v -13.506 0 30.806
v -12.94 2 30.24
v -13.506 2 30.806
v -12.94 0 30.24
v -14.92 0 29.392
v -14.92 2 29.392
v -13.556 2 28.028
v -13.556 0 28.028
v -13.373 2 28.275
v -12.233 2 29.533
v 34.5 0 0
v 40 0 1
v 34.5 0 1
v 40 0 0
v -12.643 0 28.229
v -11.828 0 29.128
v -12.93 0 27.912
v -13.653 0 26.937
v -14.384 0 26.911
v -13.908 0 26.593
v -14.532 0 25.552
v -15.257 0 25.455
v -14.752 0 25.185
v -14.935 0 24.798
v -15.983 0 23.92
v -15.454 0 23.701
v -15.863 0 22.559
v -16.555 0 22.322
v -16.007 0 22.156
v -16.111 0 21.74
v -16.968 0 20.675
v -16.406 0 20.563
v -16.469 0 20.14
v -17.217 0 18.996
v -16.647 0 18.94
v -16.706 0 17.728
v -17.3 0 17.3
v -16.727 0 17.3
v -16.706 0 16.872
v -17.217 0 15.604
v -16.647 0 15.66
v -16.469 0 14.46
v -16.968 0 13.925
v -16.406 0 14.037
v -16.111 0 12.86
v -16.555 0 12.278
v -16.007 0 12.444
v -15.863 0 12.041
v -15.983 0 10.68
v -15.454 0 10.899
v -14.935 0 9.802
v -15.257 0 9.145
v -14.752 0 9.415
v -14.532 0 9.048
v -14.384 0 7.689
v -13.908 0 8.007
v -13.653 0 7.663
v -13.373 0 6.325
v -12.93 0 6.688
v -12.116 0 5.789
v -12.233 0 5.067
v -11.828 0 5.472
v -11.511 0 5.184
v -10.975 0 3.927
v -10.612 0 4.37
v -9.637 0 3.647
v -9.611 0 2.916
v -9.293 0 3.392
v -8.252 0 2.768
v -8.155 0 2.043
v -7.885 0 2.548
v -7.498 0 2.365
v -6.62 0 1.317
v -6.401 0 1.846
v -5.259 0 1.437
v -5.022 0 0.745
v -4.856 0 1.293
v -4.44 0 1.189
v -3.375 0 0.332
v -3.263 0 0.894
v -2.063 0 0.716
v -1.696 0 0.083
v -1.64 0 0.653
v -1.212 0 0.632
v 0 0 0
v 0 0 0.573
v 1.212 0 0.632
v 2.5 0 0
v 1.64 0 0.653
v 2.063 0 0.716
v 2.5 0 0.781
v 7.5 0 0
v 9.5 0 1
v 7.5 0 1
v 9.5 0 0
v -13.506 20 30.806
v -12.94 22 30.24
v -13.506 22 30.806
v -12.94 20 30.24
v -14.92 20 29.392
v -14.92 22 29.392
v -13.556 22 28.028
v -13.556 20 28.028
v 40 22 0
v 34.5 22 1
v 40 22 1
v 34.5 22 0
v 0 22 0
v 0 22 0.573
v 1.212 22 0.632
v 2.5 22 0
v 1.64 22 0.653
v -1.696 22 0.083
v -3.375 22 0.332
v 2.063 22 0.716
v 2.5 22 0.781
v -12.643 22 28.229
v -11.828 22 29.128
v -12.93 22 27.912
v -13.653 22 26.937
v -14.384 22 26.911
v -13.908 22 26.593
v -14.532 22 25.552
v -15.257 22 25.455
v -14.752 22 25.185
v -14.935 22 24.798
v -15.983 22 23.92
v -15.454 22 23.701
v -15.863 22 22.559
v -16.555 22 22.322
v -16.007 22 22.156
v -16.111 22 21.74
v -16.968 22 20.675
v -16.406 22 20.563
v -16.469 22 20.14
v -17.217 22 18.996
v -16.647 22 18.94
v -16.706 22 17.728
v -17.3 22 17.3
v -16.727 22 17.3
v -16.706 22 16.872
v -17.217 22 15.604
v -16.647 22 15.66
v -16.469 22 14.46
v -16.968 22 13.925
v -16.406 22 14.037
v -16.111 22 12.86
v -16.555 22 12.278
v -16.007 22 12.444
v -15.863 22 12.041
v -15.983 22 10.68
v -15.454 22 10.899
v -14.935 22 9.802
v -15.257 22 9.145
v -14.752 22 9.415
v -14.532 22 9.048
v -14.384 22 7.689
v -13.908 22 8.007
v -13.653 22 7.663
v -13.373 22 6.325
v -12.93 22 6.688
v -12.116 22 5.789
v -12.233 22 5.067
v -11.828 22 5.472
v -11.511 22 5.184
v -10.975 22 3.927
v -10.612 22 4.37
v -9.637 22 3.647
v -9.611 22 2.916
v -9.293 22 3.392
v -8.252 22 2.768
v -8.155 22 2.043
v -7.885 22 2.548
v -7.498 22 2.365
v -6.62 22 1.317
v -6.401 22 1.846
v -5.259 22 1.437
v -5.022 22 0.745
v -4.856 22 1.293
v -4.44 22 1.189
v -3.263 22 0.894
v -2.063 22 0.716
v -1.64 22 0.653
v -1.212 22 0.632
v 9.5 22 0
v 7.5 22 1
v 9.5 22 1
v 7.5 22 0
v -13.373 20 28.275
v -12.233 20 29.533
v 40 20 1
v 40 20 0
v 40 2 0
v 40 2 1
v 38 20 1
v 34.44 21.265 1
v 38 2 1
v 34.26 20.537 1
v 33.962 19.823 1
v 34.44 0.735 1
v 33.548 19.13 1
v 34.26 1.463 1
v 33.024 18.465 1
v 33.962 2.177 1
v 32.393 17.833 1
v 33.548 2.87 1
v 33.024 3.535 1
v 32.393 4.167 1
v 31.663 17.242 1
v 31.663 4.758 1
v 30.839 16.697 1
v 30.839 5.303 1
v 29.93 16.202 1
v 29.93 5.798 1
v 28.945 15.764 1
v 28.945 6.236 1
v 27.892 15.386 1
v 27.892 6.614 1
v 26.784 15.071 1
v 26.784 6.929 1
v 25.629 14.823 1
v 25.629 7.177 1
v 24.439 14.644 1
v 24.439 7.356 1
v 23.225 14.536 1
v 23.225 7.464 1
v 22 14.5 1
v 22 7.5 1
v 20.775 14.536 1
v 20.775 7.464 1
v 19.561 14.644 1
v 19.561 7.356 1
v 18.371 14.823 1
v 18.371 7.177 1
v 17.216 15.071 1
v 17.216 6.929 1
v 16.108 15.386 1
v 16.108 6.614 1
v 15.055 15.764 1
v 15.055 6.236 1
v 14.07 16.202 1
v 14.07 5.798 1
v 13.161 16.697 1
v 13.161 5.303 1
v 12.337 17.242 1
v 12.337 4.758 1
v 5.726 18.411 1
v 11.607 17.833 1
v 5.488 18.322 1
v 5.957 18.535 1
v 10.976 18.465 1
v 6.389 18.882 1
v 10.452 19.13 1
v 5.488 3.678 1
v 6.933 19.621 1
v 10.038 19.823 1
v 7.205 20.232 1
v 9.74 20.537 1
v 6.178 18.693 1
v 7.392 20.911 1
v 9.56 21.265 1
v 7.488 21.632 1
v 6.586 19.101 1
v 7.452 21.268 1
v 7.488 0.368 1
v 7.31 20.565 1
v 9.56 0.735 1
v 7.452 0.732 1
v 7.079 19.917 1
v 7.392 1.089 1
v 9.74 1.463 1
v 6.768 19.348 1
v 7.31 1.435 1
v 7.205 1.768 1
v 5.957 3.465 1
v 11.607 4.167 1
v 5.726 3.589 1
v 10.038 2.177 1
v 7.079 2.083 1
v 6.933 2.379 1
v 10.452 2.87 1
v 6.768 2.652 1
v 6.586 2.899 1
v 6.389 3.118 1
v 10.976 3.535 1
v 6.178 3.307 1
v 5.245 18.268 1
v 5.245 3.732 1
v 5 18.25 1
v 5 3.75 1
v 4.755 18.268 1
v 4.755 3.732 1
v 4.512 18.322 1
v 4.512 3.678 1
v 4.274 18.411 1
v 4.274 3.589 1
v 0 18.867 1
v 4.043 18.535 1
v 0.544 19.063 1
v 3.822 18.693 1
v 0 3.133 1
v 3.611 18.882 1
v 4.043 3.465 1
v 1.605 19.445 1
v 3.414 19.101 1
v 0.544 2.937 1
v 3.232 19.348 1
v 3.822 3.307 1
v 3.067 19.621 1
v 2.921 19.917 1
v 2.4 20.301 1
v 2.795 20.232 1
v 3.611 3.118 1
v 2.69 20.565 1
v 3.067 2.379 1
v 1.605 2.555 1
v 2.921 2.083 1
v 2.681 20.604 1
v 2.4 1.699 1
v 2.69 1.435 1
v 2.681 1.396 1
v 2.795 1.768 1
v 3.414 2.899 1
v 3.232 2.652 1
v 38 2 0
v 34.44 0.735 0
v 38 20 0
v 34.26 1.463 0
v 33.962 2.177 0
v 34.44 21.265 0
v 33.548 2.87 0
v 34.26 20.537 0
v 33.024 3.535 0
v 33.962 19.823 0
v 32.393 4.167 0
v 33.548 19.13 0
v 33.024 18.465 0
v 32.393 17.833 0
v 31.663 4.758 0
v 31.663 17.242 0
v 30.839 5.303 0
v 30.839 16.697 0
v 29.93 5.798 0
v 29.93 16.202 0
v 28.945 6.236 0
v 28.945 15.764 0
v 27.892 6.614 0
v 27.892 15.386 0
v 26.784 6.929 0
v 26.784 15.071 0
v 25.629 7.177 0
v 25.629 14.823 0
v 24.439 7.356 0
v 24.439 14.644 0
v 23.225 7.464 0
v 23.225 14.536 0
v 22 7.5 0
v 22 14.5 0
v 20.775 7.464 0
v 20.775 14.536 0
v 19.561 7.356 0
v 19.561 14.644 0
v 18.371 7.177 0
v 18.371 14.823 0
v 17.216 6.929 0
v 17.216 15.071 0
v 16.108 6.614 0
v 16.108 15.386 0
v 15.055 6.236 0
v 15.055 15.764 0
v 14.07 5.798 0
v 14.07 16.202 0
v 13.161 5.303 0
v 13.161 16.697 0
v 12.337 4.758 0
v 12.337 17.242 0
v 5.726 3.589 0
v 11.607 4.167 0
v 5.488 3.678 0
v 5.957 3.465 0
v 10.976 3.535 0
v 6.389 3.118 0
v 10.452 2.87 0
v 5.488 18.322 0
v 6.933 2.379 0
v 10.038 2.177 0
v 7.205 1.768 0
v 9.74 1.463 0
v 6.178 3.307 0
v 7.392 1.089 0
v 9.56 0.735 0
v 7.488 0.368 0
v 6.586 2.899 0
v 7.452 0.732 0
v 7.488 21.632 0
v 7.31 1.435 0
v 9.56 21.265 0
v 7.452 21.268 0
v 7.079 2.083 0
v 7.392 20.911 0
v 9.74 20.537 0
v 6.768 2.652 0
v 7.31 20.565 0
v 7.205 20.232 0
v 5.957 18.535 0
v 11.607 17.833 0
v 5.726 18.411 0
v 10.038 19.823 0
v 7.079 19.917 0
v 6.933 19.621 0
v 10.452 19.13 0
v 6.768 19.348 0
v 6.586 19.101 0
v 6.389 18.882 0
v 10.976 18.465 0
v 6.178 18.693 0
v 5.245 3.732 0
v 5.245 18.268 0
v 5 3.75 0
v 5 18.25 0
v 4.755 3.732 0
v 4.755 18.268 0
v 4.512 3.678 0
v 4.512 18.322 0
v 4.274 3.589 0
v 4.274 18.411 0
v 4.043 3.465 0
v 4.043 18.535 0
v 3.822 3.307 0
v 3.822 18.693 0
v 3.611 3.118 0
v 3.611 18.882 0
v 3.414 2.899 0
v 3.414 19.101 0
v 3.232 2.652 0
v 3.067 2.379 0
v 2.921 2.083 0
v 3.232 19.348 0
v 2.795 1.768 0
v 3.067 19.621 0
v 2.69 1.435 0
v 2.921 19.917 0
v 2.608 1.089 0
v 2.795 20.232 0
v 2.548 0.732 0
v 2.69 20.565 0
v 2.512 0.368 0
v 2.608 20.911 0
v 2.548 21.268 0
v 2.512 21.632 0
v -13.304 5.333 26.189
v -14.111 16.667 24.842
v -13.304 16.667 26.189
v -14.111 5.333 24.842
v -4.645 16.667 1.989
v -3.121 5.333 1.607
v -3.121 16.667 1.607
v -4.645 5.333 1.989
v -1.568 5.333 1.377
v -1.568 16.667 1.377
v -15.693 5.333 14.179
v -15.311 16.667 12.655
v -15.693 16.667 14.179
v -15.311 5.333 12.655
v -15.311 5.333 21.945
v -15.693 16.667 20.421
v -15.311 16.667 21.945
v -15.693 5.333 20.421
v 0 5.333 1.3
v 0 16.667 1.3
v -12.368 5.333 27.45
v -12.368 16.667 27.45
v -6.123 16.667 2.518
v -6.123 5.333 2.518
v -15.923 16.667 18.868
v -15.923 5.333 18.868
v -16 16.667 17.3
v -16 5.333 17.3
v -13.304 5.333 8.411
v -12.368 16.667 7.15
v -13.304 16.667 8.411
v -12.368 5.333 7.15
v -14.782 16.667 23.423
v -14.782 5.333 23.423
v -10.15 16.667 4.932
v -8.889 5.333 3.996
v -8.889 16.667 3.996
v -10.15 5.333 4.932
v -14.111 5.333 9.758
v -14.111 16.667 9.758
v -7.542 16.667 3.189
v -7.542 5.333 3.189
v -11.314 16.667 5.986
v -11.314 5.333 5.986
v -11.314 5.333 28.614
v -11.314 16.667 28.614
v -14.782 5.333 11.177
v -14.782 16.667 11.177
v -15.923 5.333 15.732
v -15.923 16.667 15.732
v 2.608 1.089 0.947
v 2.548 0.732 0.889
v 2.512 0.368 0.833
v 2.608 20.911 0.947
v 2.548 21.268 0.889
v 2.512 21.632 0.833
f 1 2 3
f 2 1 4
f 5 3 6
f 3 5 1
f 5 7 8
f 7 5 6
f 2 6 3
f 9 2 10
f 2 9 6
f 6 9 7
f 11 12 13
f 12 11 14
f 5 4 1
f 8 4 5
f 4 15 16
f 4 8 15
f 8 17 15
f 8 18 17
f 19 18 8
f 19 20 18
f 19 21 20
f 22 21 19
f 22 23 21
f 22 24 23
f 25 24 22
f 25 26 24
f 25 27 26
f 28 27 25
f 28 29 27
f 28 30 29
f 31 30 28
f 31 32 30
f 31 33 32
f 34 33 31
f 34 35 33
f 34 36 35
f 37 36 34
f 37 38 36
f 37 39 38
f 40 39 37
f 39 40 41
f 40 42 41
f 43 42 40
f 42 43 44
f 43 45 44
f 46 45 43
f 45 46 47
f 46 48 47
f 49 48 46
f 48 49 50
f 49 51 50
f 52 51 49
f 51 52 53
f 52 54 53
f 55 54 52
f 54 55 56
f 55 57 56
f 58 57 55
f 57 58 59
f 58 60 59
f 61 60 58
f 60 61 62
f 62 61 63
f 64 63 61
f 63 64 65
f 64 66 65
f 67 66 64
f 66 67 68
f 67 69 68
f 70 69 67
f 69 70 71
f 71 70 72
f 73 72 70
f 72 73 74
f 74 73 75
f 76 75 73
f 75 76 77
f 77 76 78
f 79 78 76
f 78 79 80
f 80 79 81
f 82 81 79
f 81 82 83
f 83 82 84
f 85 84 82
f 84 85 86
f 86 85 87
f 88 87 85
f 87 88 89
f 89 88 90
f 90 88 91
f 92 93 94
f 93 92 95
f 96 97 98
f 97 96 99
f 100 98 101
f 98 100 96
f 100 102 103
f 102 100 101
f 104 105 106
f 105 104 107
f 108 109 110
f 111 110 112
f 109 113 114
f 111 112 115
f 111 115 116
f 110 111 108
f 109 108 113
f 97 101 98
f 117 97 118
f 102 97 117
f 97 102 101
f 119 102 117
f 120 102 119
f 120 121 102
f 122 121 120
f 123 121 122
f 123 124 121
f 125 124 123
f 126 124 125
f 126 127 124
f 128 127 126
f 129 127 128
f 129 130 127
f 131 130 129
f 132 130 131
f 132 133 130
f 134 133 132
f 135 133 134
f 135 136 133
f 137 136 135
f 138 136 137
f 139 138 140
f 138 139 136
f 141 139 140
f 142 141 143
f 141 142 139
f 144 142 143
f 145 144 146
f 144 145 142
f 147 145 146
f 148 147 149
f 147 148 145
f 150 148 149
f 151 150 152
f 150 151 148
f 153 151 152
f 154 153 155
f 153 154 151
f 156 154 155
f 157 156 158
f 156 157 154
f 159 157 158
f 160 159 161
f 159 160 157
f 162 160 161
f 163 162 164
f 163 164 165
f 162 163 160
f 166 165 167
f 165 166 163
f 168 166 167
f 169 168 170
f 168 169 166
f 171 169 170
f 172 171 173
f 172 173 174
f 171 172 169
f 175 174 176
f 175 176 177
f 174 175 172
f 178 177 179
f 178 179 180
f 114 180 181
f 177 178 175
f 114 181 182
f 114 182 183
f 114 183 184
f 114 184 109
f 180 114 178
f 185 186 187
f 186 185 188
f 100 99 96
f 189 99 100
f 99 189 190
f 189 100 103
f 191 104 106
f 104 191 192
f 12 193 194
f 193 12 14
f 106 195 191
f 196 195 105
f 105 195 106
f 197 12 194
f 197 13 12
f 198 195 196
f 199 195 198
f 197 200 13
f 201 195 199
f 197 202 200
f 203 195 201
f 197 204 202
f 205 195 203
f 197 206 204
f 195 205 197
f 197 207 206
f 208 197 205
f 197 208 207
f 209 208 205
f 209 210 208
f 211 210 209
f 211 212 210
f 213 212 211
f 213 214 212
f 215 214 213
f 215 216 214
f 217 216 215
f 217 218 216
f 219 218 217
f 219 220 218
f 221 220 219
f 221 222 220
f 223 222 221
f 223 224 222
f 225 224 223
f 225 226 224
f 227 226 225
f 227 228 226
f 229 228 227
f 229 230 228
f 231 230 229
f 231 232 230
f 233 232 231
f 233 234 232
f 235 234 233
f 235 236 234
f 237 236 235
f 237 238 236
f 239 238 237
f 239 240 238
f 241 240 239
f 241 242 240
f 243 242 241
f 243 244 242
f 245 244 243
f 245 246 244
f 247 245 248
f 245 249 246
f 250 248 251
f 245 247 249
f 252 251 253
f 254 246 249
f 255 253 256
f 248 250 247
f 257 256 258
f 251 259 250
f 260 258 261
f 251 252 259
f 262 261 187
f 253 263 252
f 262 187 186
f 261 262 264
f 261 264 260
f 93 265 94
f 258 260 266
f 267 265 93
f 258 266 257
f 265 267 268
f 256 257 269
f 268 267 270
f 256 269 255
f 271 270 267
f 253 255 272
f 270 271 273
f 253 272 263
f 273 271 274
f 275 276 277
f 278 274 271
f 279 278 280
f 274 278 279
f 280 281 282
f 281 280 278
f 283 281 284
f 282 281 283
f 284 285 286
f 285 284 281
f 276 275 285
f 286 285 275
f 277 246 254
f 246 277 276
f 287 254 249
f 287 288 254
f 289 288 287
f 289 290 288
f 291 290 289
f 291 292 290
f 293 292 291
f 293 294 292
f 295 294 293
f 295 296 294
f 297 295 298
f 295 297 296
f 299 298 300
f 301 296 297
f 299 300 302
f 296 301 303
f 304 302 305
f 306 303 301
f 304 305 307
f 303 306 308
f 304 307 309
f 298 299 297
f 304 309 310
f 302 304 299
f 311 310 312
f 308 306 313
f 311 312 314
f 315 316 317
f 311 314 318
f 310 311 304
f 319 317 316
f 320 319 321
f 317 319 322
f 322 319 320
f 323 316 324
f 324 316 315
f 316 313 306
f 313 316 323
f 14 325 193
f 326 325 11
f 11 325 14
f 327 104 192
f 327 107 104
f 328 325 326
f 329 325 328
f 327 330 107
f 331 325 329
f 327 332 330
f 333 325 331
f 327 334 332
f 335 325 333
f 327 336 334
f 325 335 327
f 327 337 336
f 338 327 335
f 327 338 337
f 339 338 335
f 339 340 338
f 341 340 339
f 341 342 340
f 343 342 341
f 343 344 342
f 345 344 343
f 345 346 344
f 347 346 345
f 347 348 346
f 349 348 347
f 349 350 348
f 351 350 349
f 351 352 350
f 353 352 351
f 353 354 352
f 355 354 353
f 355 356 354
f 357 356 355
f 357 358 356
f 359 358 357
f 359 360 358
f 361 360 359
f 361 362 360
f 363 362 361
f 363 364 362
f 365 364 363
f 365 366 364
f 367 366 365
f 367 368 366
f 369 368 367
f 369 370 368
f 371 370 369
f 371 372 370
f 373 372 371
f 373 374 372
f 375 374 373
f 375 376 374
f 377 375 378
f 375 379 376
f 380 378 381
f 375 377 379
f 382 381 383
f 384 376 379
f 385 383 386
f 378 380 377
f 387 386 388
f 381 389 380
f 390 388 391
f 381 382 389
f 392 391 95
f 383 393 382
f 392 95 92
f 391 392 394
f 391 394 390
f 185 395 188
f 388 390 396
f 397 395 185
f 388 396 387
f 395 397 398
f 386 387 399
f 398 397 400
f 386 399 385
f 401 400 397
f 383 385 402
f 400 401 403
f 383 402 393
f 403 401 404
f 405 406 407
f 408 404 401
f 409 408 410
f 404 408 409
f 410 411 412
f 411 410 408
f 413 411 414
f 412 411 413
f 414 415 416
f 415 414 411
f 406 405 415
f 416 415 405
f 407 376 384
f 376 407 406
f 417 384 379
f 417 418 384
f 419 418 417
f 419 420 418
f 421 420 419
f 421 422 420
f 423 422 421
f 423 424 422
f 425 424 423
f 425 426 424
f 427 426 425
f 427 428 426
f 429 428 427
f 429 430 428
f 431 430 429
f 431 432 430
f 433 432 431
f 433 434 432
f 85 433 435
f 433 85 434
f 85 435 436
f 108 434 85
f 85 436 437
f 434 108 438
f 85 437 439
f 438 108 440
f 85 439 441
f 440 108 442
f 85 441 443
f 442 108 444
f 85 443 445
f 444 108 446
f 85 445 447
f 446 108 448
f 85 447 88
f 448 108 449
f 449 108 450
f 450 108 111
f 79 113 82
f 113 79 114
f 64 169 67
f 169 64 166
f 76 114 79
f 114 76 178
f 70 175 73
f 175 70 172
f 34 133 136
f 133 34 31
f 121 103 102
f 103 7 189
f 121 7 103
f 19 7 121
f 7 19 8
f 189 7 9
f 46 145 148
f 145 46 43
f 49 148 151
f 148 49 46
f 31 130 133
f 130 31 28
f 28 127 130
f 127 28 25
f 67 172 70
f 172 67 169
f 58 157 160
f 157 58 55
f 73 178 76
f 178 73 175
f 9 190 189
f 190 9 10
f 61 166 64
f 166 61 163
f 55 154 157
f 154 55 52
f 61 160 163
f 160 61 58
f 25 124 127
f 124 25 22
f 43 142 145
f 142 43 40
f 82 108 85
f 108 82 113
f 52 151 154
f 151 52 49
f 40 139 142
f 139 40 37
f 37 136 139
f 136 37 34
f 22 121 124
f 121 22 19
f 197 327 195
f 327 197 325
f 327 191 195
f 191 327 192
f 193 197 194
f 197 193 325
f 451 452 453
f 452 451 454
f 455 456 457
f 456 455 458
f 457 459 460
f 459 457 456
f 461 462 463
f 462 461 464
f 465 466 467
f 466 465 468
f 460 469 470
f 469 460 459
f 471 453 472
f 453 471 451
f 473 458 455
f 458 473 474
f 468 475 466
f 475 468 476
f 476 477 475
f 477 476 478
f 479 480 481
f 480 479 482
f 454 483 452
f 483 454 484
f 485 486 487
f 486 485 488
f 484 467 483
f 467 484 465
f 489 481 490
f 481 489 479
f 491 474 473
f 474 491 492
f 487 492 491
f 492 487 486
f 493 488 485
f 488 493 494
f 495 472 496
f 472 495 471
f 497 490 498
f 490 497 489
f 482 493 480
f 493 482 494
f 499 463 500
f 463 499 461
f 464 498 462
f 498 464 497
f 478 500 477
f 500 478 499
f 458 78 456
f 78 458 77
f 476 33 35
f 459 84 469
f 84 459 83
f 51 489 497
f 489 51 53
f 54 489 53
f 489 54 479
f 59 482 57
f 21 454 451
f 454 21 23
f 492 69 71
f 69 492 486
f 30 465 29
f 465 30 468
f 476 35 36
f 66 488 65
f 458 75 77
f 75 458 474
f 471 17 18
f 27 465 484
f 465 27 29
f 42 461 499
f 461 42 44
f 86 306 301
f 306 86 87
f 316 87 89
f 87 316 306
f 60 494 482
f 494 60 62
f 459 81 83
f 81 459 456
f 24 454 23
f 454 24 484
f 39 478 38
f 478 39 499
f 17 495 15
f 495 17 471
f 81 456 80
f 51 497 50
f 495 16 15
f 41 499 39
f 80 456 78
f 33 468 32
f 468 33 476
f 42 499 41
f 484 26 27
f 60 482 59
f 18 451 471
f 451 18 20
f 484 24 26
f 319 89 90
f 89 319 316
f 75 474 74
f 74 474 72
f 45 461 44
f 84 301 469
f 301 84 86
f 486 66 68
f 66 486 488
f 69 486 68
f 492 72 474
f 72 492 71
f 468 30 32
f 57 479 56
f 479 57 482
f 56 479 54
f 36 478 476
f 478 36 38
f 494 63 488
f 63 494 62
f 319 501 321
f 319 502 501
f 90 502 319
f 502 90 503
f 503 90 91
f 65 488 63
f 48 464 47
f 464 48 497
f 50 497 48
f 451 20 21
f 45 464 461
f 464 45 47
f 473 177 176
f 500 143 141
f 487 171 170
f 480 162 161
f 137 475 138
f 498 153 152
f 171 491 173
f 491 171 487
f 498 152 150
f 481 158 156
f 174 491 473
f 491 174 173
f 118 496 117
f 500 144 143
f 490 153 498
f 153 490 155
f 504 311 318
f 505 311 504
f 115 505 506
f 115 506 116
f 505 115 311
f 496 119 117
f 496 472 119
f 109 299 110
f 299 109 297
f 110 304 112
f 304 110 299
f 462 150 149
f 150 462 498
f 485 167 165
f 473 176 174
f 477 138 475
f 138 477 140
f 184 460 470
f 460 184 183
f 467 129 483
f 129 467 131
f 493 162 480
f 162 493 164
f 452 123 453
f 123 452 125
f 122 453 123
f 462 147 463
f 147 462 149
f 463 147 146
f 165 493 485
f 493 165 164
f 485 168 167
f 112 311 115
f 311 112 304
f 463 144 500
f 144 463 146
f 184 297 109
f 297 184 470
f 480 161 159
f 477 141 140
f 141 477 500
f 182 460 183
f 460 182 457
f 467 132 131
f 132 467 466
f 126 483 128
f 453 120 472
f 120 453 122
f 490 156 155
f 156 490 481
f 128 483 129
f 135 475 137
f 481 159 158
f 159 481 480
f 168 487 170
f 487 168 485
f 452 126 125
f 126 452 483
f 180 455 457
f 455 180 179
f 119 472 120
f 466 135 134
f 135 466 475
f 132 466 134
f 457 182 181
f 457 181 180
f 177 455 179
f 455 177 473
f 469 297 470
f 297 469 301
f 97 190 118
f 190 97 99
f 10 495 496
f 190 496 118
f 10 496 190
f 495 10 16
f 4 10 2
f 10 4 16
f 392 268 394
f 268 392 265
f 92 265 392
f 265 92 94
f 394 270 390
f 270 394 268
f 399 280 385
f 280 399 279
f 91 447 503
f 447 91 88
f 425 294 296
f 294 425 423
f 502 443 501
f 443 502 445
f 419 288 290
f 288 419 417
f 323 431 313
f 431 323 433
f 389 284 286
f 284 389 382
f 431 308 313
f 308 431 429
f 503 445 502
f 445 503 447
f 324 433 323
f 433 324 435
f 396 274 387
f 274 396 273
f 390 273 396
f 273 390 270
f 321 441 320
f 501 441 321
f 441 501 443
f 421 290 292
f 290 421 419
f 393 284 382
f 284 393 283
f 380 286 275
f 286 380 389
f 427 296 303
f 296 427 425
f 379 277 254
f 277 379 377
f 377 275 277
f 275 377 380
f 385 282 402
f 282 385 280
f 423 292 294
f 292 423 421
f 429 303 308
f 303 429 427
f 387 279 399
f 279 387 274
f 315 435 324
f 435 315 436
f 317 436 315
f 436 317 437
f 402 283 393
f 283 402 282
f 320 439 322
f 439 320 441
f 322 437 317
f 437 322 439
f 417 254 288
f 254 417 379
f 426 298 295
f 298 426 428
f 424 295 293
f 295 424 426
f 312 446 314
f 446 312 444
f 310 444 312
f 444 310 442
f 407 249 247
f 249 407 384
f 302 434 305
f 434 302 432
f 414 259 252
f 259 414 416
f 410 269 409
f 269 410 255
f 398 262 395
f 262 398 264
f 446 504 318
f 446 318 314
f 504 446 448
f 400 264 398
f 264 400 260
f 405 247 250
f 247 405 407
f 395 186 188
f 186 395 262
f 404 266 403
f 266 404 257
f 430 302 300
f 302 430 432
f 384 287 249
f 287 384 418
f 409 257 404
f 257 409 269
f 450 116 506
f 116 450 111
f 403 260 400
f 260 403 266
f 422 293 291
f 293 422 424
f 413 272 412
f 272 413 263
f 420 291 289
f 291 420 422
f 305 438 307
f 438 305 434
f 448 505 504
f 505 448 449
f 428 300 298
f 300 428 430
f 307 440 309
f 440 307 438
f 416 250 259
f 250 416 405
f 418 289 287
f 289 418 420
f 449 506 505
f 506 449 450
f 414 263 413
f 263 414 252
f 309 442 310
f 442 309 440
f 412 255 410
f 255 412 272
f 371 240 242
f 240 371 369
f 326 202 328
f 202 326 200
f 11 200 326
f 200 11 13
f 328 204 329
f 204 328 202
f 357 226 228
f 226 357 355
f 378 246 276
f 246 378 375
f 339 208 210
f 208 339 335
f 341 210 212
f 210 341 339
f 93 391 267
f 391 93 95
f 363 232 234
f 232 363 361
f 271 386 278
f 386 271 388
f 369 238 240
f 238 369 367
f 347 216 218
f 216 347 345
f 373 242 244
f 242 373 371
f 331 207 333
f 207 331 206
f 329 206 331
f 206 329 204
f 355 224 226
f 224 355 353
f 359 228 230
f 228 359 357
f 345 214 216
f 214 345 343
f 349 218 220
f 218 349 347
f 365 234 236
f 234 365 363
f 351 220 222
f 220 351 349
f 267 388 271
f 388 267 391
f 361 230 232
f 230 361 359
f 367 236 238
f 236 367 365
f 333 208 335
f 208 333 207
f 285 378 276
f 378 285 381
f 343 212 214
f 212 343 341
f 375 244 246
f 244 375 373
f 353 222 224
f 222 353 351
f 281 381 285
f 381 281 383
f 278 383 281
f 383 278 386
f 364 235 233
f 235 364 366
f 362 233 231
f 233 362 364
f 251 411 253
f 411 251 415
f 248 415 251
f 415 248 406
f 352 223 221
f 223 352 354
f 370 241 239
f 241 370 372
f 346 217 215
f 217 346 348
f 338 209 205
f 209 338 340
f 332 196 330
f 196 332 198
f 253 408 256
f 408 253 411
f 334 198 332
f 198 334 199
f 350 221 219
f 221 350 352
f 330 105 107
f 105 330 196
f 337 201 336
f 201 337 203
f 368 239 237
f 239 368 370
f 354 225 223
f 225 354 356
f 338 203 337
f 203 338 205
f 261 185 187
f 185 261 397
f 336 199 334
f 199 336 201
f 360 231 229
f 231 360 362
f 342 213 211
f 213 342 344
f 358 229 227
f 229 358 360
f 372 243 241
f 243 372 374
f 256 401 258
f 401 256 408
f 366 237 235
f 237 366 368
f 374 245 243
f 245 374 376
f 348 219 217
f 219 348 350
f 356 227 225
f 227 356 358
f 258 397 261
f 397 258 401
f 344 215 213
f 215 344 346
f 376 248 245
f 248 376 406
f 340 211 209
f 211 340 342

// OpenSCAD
$fn=64;
z=[0,0,1];

r=16;
d=1.3;
w=22;
difference() {
    union(){
        cube([40,w,1]);
        translate(z*(r+d)) rotate([-90,0]) cylinder(r=r+d, h=w);
        translate(z*(r+d))
        rotate([0,-45,0])
            translate([-2,0,(r+d-0.2)])
            {   cube(2);
                translate([0,w-2]) cube(2);
            }
    }
    translate([38,2,-1]) cube([4,w-4,4]);
    translate([0,-1,r+d]) rotate([-90,0])  cylinder(r=r, h=w+2);
    translate([0,-2,r+d]) rotate([-90,0])  cylinder(r1=r+1, r2=r, h=w/3);
    translate([0,(2*w/3)+2,r+d]) rotate([-90,0])  cylinder(r1=r, r2=r+1, h=w/3);
    translate([0,-1,1])
        cube([50,w+2,2*r]);
    
    translate([0,-1,r+d])
        rotate([0,-45,0])
            cube([r+d+1,w+2,r+d+1]);
    
    translate([5, 0,0]) scale([1,1.5,1]) cylinder(center=true, d=5, h=5);
    translate([5, w,0]) scale([1,1.5,1]) cylinder(center=true, d=5, h=5);
    
    translate([22, 0,0]) scale([5,3,1]) cylinder(center=true, d=5, h=5);
    translate([22, w,0]) scale([5,3,1]) cylinder(center=true, d=5, h=5);
}
